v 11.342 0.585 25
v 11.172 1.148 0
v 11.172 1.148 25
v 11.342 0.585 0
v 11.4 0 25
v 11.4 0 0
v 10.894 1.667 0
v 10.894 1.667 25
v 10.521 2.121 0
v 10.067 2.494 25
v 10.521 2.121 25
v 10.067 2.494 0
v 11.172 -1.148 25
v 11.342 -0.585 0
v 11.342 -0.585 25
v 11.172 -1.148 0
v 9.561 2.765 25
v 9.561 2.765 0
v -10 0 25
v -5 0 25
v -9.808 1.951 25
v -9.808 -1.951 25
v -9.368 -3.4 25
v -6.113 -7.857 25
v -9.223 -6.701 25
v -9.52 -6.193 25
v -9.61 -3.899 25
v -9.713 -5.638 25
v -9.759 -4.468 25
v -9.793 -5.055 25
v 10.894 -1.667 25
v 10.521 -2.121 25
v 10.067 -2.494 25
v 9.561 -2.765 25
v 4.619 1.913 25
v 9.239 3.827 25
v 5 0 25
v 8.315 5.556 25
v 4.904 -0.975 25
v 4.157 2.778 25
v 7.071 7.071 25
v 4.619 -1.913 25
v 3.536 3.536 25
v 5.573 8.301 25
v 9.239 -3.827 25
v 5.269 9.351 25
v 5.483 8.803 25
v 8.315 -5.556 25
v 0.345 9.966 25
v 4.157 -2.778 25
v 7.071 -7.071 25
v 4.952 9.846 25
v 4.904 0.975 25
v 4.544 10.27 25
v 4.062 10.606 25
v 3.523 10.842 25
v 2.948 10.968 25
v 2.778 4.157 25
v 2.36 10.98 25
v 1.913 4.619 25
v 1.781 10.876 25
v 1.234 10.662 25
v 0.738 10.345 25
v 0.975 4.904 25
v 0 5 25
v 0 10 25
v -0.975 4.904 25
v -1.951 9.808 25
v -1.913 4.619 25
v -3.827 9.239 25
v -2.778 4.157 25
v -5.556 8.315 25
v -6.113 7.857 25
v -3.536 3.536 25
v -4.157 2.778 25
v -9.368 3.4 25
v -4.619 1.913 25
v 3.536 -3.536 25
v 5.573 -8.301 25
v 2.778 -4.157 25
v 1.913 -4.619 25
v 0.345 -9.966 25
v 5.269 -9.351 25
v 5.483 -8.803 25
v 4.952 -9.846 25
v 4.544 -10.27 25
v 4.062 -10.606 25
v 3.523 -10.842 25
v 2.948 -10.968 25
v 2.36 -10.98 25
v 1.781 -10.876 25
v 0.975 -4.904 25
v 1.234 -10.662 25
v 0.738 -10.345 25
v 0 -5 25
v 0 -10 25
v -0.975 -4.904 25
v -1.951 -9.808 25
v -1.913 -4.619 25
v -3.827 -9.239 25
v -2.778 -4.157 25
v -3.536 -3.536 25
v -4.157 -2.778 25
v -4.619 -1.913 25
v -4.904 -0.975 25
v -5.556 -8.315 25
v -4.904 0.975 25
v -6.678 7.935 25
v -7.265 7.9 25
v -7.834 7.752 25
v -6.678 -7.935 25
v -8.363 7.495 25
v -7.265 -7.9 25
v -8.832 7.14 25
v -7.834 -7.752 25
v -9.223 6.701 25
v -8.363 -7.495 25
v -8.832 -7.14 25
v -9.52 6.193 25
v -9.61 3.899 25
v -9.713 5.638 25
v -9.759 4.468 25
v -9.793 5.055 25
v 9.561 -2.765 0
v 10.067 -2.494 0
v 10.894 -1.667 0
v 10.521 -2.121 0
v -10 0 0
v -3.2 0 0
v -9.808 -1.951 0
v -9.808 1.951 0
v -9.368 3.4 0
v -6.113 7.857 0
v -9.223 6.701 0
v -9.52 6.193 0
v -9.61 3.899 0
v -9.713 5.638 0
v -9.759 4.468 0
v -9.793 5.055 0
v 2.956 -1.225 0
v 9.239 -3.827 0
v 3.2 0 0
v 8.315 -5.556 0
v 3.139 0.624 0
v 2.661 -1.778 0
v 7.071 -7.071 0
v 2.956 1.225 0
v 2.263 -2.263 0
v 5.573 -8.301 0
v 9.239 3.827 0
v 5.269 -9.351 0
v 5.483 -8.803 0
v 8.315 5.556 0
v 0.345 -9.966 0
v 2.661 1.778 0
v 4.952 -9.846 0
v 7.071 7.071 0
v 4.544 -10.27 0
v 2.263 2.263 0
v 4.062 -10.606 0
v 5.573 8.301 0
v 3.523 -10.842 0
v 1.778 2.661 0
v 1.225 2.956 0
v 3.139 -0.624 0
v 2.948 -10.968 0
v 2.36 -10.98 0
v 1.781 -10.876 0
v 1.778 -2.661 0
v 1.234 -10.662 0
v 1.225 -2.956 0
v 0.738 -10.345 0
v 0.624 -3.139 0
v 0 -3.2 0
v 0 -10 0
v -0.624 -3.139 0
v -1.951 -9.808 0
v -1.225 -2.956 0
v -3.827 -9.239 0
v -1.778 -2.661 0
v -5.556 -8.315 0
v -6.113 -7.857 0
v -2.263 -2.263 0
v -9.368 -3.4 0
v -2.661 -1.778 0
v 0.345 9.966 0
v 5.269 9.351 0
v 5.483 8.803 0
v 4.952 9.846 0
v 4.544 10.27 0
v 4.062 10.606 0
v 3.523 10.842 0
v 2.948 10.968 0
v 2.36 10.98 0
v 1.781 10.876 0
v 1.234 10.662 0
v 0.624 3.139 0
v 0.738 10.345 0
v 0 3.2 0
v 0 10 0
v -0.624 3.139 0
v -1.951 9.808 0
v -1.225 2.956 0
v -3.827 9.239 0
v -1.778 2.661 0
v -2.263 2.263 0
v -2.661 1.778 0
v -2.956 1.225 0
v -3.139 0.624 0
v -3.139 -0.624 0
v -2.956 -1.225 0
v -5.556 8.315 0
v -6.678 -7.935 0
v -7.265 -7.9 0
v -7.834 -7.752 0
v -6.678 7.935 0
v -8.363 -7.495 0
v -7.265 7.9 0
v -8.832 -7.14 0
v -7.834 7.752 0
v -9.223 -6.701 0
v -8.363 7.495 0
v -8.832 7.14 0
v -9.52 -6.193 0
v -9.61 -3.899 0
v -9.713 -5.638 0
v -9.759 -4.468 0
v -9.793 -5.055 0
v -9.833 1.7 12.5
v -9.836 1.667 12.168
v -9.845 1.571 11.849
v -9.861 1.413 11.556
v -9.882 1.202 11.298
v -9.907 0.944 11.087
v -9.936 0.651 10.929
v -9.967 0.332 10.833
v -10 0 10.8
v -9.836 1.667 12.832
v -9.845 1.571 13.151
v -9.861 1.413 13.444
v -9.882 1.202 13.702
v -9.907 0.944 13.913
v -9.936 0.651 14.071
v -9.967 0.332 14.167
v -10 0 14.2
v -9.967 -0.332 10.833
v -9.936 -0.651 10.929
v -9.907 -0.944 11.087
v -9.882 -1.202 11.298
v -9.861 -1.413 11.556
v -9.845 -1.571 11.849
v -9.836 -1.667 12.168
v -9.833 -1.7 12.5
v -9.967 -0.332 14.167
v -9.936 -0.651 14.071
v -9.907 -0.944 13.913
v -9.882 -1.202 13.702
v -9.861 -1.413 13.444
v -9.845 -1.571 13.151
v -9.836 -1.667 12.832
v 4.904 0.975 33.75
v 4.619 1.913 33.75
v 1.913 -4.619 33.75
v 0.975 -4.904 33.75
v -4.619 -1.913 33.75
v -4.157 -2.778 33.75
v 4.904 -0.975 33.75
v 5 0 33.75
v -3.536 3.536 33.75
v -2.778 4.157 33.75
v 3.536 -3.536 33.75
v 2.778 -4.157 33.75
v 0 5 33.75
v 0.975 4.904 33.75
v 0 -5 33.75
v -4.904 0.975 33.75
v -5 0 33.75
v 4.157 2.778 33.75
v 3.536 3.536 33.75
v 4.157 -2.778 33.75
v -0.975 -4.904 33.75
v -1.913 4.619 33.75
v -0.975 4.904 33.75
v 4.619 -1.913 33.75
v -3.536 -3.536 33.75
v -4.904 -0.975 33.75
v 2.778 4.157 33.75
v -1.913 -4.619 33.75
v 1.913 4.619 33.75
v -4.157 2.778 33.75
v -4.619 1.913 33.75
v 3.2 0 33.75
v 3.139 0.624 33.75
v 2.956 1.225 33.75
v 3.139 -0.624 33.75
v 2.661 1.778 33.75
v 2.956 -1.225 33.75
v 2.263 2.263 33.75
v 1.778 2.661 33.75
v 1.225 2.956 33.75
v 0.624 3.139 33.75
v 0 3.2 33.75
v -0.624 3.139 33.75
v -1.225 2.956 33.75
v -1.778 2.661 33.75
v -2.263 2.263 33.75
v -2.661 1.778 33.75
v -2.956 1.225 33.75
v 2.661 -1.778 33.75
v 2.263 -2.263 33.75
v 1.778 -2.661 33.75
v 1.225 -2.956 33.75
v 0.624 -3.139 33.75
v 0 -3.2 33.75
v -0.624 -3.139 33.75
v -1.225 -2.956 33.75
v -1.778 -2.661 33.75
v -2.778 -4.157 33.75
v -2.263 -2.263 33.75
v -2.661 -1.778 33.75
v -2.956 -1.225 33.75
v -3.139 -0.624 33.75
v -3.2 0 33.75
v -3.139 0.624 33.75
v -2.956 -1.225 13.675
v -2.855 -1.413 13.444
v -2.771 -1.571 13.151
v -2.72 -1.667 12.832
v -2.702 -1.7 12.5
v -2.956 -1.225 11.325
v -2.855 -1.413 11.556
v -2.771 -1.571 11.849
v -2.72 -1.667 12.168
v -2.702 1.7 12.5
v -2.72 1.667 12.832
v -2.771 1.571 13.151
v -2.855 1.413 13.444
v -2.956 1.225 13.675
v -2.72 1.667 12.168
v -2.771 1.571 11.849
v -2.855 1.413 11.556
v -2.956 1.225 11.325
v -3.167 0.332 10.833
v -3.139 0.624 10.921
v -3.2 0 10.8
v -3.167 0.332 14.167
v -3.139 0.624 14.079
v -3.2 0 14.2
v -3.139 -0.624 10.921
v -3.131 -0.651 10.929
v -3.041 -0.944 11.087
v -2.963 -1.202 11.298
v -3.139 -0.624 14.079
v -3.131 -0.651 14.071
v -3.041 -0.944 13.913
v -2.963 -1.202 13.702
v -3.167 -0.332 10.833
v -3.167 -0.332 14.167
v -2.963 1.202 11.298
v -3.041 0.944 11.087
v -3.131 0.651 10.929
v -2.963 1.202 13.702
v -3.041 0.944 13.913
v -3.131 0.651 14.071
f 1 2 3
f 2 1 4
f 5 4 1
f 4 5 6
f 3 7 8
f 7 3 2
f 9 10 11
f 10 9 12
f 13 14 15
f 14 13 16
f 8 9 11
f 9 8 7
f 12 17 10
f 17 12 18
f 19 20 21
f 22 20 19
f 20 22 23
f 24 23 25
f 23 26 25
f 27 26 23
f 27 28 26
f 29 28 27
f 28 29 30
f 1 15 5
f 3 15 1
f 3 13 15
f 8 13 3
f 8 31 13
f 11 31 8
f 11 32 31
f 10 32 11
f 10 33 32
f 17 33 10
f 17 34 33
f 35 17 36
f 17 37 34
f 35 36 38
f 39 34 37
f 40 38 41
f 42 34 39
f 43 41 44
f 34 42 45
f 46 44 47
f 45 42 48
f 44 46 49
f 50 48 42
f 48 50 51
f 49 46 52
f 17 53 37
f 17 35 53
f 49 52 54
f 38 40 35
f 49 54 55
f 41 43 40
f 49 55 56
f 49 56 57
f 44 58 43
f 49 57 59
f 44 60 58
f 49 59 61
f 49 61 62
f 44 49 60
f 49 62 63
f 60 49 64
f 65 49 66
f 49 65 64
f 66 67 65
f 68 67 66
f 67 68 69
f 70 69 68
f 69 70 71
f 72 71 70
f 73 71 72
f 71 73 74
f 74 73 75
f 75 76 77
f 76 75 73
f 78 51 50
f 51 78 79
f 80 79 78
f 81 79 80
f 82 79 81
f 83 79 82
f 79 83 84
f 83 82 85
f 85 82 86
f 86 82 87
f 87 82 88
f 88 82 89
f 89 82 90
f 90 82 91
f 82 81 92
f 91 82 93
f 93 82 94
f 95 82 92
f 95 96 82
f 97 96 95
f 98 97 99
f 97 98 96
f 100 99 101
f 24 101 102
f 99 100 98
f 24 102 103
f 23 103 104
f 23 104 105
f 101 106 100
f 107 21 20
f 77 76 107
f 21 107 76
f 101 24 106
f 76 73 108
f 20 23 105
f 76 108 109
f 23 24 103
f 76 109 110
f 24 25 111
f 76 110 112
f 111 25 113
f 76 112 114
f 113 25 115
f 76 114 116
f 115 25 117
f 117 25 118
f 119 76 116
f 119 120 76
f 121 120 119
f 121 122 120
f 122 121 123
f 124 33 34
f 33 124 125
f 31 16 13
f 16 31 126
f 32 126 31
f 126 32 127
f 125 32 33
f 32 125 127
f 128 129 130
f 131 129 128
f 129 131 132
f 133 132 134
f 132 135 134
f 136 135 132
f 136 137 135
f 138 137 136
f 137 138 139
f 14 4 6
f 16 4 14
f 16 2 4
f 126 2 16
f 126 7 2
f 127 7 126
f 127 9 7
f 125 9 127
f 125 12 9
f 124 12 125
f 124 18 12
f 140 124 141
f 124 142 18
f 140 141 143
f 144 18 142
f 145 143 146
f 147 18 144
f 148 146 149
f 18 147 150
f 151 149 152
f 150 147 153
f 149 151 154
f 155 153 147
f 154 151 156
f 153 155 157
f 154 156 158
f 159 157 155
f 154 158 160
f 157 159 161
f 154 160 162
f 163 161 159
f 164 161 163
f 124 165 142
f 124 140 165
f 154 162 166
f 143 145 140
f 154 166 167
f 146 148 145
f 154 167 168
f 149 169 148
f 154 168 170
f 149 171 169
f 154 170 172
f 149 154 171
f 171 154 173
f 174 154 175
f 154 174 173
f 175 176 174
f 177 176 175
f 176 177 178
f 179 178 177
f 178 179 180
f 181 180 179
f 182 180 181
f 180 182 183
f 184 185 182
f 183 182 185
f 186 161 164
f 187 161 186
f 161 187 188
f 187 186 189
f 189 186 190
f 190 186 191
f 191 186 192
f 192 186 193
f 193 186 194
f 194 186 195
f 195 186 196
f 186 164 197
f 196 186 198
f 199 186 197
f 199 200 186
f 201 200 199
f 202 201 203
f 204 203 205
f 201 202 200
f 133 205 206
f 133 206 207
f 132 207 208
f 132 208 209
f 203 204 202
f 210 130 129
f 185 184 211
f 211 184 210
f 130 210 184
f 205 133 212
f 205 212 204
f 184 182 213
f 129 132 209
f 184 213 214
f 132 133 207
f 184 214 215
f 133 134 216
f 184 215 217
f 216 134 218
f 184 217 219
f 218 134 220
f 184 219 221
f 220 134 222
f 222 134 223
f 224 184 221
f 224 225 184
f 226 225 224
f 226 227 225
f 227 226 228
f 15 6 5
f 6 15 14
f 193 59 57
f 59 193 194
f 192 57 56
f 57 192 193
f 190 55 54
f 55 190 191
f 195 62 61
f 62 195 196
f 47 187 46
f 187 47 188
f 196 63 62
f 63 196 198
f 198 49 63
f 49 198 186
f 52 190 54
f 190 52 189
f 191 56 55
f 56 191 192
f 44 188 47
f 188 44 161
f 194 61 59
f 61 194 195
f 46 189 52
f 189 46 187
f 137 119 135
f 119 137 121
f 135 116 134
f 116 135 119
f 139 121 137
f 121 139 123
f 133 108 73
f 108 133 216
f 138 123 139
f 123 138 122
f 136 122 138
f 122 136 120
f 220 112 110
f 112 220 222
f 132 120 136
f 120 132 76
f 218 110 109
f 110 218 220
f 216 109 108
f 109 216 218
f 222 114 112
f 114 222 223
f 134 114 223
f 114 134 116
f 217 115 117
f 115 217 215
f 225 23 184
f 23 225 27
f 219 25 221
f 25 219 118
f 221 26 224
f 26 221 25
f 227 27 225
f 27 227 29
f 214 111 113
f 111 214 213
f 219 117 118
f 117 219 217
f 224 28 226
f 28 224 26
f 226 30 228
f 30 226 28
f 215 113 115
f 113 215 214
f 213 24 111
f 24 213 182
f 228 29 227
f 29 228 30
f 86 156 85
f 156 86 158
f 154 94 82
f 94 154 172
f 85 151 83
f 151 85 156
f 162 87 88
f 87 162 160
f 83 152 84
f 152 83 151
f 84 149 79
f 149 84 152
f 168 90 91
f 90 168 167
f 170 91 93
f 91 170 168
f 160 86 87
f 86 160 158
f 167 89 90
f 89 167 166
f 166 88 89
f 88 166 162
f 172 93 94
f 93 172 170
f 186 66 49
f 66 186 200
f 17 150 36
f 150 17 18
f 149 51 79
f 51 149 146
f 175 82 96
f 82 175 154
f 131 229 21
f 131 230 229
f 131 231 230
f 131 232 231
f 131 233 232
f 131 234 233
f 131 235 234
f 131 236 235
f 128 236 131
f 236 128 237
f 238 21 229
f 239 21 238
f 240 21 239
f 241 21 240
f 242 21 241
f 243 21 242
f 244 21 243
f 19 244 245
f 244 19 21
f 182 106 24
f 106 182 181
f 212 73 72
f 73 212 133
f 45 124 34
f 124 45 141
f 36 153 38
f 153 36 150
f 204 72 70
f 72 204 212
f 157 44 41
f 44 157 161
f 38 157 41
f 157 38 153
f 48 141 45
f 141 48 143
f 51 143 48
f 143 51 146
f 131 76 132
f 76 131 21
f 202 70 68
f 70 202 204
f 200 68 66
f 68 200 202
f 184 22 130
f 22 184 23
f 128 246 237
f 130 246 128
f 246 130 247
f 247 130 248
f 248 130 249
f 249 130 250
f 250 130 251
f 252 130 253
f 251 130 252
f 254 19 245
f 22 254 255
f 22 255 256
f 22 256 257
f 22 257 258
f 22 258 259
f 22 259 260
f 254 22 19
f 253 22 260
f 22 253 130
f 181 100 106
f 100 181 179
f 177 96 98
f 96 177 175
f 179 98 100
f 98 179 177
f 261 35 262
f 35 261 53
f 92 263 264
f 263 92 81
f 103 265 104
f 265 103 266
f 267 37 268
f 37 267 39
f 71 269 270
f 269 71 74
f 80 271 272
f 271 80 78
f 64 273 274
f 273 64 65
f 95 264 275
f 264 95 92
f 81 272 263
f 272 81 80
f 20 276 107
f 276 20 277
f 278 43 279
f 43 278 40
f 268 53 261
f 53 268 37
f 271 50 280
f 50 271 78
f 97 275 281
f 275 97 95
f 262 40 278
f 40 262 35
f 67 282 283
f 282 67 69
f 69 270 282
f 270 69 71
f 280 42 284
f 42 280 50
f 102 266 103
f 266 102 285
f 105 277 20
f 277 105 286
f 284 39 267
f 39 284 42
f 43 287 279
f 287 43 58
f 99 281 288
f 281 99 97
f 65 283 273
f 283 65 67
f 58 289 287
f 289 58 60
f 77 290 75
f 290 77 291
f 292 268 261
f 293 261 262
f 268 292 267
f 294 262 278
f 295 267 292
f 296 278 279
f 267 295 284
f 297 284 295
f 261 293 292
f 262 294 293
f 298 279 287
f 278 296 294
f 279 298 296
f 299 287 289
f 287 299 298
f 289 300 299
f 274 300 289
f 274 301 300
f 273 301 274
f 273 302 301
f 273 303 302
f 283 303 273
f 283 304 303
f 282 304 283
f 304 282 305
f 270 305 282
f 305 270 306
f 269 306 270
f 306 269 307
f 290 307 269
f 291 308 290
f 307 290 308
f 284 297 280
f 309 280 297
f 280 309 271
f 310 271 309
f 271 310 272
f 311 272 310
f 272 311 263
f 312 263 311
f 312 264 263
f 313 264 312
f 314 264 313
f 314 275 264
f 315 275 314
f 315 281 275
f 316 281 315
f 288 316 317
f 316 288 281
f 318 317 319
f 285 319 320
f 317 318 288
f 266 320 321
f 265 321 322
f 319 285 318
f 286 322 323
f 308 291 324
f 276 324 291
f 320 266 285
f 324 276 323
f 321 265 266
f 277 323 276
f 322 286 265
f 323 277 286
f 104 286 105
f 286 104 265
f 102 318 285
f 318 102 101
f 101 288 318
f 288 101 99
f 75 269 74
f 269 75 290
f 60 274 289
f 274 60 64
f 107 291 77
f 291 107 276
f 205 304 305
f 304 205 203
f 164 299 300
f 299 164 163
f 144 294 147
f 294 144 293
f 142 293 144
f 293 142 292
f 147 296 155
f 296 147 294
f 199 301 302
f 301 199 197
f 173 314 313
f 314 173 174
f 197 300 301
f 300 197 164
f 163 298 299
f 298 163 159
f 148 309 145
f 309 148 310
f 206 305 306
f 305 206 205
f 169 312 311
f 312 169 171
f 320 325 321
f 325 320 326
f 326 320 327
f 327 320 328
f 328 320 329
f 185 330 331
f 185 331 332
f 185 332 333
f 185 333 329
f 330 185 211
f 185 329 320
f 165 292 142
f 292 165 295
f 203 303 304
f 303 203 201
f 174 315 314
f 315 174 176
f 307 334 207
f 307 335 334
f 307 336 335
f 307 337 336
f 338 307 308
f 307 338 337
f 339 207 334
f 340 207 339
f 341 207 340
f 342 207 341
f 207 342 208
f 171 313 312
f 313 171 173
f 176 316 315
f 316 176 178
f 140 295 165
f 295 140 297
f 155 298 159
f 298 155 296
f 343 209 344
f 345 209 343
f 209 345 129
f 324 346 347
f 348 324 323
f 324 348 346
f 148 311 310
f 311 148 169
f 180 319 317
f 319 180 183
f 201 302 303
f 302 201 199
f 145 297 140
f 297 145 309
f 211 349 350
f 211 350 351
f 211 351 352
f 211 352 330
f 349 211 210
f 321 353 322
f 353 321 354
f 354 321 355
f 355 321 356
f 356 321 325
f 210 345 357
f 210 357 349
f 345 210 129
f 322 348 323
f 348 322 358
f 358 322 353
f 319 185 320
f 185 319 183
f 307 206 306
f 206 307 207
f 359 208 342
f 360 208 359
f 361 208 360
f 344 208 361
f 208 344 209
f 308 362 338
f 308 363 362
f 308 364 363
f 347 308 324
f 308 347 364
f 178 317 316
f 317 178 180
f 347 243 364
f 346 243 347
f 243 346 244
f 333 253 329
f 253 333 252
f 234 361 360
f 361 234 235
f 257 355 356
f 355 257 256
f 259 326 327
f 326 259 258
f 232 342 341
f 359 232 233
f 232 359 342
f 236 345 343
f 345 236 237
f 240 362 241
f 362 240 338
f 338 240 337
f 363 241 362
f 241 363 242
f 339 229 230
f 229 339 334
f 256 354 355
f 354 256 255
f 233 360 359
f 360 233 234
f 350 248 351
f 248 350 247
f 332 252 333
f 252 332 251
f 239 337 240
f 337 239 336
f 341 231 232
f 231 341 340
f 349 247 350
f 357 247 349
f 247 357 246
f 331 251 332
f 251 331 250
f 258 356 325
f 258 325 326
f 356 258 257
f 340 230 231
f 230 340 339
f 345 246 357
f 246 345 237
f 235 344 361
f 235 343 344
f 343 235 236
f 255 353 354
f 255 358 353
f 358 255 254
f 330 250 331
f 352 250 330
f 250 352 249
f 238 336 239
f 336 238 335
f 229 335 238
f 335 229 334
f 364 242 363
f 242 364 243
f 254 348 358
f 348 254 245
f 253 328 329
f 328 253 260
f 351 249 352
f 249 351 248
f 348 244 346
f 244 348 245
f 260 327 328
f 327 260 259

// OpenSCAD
$fn = 32;

// ----------------------------------------------------------------------
// Hand knob: 20 x 20 x 33.75 mm
// ----------------------------------------------------------------------

// --- parameters (mm) ---
head_d = 20;              // knob diameter
head_h = 25;              // knob height
hole_d = 6.4;             // shaft bore
set_d = 3.4;              // set screw tap hole
notch_d = 0.56;           // knurl groove diameter
lobes = 5;                // grip lobes
cap_h = 8.75;             // raised centre cap
cap_d = 10;               // centre cap diameter

module body() {
  cylinder(h = head_h, d = head_d);
  for (i = [0 : lobes - 1])
    rotate([0, 0, i * 360 / lobes])
      translate([head_d * 0.42, 0, 0])
        cylinder(h = head_h, d = head_d * 0.3);
}

module cap() {
  translate([0, 0, head_h - 1]) cylinder(h = cap_h + 1, d = cap_d);
}

difference() {
  union() {
    body();
    cap();
  }
  translate([0, 0, -1]) cylinder(h = head_h + cap_h + 2, d = hole_d);
  translate([-head_d / 2 - 1, 0, head_h * 0.5]) rotate([0, 90, 0]) cylinder(h = head_d / 2 + 2, d = set_d);
}
